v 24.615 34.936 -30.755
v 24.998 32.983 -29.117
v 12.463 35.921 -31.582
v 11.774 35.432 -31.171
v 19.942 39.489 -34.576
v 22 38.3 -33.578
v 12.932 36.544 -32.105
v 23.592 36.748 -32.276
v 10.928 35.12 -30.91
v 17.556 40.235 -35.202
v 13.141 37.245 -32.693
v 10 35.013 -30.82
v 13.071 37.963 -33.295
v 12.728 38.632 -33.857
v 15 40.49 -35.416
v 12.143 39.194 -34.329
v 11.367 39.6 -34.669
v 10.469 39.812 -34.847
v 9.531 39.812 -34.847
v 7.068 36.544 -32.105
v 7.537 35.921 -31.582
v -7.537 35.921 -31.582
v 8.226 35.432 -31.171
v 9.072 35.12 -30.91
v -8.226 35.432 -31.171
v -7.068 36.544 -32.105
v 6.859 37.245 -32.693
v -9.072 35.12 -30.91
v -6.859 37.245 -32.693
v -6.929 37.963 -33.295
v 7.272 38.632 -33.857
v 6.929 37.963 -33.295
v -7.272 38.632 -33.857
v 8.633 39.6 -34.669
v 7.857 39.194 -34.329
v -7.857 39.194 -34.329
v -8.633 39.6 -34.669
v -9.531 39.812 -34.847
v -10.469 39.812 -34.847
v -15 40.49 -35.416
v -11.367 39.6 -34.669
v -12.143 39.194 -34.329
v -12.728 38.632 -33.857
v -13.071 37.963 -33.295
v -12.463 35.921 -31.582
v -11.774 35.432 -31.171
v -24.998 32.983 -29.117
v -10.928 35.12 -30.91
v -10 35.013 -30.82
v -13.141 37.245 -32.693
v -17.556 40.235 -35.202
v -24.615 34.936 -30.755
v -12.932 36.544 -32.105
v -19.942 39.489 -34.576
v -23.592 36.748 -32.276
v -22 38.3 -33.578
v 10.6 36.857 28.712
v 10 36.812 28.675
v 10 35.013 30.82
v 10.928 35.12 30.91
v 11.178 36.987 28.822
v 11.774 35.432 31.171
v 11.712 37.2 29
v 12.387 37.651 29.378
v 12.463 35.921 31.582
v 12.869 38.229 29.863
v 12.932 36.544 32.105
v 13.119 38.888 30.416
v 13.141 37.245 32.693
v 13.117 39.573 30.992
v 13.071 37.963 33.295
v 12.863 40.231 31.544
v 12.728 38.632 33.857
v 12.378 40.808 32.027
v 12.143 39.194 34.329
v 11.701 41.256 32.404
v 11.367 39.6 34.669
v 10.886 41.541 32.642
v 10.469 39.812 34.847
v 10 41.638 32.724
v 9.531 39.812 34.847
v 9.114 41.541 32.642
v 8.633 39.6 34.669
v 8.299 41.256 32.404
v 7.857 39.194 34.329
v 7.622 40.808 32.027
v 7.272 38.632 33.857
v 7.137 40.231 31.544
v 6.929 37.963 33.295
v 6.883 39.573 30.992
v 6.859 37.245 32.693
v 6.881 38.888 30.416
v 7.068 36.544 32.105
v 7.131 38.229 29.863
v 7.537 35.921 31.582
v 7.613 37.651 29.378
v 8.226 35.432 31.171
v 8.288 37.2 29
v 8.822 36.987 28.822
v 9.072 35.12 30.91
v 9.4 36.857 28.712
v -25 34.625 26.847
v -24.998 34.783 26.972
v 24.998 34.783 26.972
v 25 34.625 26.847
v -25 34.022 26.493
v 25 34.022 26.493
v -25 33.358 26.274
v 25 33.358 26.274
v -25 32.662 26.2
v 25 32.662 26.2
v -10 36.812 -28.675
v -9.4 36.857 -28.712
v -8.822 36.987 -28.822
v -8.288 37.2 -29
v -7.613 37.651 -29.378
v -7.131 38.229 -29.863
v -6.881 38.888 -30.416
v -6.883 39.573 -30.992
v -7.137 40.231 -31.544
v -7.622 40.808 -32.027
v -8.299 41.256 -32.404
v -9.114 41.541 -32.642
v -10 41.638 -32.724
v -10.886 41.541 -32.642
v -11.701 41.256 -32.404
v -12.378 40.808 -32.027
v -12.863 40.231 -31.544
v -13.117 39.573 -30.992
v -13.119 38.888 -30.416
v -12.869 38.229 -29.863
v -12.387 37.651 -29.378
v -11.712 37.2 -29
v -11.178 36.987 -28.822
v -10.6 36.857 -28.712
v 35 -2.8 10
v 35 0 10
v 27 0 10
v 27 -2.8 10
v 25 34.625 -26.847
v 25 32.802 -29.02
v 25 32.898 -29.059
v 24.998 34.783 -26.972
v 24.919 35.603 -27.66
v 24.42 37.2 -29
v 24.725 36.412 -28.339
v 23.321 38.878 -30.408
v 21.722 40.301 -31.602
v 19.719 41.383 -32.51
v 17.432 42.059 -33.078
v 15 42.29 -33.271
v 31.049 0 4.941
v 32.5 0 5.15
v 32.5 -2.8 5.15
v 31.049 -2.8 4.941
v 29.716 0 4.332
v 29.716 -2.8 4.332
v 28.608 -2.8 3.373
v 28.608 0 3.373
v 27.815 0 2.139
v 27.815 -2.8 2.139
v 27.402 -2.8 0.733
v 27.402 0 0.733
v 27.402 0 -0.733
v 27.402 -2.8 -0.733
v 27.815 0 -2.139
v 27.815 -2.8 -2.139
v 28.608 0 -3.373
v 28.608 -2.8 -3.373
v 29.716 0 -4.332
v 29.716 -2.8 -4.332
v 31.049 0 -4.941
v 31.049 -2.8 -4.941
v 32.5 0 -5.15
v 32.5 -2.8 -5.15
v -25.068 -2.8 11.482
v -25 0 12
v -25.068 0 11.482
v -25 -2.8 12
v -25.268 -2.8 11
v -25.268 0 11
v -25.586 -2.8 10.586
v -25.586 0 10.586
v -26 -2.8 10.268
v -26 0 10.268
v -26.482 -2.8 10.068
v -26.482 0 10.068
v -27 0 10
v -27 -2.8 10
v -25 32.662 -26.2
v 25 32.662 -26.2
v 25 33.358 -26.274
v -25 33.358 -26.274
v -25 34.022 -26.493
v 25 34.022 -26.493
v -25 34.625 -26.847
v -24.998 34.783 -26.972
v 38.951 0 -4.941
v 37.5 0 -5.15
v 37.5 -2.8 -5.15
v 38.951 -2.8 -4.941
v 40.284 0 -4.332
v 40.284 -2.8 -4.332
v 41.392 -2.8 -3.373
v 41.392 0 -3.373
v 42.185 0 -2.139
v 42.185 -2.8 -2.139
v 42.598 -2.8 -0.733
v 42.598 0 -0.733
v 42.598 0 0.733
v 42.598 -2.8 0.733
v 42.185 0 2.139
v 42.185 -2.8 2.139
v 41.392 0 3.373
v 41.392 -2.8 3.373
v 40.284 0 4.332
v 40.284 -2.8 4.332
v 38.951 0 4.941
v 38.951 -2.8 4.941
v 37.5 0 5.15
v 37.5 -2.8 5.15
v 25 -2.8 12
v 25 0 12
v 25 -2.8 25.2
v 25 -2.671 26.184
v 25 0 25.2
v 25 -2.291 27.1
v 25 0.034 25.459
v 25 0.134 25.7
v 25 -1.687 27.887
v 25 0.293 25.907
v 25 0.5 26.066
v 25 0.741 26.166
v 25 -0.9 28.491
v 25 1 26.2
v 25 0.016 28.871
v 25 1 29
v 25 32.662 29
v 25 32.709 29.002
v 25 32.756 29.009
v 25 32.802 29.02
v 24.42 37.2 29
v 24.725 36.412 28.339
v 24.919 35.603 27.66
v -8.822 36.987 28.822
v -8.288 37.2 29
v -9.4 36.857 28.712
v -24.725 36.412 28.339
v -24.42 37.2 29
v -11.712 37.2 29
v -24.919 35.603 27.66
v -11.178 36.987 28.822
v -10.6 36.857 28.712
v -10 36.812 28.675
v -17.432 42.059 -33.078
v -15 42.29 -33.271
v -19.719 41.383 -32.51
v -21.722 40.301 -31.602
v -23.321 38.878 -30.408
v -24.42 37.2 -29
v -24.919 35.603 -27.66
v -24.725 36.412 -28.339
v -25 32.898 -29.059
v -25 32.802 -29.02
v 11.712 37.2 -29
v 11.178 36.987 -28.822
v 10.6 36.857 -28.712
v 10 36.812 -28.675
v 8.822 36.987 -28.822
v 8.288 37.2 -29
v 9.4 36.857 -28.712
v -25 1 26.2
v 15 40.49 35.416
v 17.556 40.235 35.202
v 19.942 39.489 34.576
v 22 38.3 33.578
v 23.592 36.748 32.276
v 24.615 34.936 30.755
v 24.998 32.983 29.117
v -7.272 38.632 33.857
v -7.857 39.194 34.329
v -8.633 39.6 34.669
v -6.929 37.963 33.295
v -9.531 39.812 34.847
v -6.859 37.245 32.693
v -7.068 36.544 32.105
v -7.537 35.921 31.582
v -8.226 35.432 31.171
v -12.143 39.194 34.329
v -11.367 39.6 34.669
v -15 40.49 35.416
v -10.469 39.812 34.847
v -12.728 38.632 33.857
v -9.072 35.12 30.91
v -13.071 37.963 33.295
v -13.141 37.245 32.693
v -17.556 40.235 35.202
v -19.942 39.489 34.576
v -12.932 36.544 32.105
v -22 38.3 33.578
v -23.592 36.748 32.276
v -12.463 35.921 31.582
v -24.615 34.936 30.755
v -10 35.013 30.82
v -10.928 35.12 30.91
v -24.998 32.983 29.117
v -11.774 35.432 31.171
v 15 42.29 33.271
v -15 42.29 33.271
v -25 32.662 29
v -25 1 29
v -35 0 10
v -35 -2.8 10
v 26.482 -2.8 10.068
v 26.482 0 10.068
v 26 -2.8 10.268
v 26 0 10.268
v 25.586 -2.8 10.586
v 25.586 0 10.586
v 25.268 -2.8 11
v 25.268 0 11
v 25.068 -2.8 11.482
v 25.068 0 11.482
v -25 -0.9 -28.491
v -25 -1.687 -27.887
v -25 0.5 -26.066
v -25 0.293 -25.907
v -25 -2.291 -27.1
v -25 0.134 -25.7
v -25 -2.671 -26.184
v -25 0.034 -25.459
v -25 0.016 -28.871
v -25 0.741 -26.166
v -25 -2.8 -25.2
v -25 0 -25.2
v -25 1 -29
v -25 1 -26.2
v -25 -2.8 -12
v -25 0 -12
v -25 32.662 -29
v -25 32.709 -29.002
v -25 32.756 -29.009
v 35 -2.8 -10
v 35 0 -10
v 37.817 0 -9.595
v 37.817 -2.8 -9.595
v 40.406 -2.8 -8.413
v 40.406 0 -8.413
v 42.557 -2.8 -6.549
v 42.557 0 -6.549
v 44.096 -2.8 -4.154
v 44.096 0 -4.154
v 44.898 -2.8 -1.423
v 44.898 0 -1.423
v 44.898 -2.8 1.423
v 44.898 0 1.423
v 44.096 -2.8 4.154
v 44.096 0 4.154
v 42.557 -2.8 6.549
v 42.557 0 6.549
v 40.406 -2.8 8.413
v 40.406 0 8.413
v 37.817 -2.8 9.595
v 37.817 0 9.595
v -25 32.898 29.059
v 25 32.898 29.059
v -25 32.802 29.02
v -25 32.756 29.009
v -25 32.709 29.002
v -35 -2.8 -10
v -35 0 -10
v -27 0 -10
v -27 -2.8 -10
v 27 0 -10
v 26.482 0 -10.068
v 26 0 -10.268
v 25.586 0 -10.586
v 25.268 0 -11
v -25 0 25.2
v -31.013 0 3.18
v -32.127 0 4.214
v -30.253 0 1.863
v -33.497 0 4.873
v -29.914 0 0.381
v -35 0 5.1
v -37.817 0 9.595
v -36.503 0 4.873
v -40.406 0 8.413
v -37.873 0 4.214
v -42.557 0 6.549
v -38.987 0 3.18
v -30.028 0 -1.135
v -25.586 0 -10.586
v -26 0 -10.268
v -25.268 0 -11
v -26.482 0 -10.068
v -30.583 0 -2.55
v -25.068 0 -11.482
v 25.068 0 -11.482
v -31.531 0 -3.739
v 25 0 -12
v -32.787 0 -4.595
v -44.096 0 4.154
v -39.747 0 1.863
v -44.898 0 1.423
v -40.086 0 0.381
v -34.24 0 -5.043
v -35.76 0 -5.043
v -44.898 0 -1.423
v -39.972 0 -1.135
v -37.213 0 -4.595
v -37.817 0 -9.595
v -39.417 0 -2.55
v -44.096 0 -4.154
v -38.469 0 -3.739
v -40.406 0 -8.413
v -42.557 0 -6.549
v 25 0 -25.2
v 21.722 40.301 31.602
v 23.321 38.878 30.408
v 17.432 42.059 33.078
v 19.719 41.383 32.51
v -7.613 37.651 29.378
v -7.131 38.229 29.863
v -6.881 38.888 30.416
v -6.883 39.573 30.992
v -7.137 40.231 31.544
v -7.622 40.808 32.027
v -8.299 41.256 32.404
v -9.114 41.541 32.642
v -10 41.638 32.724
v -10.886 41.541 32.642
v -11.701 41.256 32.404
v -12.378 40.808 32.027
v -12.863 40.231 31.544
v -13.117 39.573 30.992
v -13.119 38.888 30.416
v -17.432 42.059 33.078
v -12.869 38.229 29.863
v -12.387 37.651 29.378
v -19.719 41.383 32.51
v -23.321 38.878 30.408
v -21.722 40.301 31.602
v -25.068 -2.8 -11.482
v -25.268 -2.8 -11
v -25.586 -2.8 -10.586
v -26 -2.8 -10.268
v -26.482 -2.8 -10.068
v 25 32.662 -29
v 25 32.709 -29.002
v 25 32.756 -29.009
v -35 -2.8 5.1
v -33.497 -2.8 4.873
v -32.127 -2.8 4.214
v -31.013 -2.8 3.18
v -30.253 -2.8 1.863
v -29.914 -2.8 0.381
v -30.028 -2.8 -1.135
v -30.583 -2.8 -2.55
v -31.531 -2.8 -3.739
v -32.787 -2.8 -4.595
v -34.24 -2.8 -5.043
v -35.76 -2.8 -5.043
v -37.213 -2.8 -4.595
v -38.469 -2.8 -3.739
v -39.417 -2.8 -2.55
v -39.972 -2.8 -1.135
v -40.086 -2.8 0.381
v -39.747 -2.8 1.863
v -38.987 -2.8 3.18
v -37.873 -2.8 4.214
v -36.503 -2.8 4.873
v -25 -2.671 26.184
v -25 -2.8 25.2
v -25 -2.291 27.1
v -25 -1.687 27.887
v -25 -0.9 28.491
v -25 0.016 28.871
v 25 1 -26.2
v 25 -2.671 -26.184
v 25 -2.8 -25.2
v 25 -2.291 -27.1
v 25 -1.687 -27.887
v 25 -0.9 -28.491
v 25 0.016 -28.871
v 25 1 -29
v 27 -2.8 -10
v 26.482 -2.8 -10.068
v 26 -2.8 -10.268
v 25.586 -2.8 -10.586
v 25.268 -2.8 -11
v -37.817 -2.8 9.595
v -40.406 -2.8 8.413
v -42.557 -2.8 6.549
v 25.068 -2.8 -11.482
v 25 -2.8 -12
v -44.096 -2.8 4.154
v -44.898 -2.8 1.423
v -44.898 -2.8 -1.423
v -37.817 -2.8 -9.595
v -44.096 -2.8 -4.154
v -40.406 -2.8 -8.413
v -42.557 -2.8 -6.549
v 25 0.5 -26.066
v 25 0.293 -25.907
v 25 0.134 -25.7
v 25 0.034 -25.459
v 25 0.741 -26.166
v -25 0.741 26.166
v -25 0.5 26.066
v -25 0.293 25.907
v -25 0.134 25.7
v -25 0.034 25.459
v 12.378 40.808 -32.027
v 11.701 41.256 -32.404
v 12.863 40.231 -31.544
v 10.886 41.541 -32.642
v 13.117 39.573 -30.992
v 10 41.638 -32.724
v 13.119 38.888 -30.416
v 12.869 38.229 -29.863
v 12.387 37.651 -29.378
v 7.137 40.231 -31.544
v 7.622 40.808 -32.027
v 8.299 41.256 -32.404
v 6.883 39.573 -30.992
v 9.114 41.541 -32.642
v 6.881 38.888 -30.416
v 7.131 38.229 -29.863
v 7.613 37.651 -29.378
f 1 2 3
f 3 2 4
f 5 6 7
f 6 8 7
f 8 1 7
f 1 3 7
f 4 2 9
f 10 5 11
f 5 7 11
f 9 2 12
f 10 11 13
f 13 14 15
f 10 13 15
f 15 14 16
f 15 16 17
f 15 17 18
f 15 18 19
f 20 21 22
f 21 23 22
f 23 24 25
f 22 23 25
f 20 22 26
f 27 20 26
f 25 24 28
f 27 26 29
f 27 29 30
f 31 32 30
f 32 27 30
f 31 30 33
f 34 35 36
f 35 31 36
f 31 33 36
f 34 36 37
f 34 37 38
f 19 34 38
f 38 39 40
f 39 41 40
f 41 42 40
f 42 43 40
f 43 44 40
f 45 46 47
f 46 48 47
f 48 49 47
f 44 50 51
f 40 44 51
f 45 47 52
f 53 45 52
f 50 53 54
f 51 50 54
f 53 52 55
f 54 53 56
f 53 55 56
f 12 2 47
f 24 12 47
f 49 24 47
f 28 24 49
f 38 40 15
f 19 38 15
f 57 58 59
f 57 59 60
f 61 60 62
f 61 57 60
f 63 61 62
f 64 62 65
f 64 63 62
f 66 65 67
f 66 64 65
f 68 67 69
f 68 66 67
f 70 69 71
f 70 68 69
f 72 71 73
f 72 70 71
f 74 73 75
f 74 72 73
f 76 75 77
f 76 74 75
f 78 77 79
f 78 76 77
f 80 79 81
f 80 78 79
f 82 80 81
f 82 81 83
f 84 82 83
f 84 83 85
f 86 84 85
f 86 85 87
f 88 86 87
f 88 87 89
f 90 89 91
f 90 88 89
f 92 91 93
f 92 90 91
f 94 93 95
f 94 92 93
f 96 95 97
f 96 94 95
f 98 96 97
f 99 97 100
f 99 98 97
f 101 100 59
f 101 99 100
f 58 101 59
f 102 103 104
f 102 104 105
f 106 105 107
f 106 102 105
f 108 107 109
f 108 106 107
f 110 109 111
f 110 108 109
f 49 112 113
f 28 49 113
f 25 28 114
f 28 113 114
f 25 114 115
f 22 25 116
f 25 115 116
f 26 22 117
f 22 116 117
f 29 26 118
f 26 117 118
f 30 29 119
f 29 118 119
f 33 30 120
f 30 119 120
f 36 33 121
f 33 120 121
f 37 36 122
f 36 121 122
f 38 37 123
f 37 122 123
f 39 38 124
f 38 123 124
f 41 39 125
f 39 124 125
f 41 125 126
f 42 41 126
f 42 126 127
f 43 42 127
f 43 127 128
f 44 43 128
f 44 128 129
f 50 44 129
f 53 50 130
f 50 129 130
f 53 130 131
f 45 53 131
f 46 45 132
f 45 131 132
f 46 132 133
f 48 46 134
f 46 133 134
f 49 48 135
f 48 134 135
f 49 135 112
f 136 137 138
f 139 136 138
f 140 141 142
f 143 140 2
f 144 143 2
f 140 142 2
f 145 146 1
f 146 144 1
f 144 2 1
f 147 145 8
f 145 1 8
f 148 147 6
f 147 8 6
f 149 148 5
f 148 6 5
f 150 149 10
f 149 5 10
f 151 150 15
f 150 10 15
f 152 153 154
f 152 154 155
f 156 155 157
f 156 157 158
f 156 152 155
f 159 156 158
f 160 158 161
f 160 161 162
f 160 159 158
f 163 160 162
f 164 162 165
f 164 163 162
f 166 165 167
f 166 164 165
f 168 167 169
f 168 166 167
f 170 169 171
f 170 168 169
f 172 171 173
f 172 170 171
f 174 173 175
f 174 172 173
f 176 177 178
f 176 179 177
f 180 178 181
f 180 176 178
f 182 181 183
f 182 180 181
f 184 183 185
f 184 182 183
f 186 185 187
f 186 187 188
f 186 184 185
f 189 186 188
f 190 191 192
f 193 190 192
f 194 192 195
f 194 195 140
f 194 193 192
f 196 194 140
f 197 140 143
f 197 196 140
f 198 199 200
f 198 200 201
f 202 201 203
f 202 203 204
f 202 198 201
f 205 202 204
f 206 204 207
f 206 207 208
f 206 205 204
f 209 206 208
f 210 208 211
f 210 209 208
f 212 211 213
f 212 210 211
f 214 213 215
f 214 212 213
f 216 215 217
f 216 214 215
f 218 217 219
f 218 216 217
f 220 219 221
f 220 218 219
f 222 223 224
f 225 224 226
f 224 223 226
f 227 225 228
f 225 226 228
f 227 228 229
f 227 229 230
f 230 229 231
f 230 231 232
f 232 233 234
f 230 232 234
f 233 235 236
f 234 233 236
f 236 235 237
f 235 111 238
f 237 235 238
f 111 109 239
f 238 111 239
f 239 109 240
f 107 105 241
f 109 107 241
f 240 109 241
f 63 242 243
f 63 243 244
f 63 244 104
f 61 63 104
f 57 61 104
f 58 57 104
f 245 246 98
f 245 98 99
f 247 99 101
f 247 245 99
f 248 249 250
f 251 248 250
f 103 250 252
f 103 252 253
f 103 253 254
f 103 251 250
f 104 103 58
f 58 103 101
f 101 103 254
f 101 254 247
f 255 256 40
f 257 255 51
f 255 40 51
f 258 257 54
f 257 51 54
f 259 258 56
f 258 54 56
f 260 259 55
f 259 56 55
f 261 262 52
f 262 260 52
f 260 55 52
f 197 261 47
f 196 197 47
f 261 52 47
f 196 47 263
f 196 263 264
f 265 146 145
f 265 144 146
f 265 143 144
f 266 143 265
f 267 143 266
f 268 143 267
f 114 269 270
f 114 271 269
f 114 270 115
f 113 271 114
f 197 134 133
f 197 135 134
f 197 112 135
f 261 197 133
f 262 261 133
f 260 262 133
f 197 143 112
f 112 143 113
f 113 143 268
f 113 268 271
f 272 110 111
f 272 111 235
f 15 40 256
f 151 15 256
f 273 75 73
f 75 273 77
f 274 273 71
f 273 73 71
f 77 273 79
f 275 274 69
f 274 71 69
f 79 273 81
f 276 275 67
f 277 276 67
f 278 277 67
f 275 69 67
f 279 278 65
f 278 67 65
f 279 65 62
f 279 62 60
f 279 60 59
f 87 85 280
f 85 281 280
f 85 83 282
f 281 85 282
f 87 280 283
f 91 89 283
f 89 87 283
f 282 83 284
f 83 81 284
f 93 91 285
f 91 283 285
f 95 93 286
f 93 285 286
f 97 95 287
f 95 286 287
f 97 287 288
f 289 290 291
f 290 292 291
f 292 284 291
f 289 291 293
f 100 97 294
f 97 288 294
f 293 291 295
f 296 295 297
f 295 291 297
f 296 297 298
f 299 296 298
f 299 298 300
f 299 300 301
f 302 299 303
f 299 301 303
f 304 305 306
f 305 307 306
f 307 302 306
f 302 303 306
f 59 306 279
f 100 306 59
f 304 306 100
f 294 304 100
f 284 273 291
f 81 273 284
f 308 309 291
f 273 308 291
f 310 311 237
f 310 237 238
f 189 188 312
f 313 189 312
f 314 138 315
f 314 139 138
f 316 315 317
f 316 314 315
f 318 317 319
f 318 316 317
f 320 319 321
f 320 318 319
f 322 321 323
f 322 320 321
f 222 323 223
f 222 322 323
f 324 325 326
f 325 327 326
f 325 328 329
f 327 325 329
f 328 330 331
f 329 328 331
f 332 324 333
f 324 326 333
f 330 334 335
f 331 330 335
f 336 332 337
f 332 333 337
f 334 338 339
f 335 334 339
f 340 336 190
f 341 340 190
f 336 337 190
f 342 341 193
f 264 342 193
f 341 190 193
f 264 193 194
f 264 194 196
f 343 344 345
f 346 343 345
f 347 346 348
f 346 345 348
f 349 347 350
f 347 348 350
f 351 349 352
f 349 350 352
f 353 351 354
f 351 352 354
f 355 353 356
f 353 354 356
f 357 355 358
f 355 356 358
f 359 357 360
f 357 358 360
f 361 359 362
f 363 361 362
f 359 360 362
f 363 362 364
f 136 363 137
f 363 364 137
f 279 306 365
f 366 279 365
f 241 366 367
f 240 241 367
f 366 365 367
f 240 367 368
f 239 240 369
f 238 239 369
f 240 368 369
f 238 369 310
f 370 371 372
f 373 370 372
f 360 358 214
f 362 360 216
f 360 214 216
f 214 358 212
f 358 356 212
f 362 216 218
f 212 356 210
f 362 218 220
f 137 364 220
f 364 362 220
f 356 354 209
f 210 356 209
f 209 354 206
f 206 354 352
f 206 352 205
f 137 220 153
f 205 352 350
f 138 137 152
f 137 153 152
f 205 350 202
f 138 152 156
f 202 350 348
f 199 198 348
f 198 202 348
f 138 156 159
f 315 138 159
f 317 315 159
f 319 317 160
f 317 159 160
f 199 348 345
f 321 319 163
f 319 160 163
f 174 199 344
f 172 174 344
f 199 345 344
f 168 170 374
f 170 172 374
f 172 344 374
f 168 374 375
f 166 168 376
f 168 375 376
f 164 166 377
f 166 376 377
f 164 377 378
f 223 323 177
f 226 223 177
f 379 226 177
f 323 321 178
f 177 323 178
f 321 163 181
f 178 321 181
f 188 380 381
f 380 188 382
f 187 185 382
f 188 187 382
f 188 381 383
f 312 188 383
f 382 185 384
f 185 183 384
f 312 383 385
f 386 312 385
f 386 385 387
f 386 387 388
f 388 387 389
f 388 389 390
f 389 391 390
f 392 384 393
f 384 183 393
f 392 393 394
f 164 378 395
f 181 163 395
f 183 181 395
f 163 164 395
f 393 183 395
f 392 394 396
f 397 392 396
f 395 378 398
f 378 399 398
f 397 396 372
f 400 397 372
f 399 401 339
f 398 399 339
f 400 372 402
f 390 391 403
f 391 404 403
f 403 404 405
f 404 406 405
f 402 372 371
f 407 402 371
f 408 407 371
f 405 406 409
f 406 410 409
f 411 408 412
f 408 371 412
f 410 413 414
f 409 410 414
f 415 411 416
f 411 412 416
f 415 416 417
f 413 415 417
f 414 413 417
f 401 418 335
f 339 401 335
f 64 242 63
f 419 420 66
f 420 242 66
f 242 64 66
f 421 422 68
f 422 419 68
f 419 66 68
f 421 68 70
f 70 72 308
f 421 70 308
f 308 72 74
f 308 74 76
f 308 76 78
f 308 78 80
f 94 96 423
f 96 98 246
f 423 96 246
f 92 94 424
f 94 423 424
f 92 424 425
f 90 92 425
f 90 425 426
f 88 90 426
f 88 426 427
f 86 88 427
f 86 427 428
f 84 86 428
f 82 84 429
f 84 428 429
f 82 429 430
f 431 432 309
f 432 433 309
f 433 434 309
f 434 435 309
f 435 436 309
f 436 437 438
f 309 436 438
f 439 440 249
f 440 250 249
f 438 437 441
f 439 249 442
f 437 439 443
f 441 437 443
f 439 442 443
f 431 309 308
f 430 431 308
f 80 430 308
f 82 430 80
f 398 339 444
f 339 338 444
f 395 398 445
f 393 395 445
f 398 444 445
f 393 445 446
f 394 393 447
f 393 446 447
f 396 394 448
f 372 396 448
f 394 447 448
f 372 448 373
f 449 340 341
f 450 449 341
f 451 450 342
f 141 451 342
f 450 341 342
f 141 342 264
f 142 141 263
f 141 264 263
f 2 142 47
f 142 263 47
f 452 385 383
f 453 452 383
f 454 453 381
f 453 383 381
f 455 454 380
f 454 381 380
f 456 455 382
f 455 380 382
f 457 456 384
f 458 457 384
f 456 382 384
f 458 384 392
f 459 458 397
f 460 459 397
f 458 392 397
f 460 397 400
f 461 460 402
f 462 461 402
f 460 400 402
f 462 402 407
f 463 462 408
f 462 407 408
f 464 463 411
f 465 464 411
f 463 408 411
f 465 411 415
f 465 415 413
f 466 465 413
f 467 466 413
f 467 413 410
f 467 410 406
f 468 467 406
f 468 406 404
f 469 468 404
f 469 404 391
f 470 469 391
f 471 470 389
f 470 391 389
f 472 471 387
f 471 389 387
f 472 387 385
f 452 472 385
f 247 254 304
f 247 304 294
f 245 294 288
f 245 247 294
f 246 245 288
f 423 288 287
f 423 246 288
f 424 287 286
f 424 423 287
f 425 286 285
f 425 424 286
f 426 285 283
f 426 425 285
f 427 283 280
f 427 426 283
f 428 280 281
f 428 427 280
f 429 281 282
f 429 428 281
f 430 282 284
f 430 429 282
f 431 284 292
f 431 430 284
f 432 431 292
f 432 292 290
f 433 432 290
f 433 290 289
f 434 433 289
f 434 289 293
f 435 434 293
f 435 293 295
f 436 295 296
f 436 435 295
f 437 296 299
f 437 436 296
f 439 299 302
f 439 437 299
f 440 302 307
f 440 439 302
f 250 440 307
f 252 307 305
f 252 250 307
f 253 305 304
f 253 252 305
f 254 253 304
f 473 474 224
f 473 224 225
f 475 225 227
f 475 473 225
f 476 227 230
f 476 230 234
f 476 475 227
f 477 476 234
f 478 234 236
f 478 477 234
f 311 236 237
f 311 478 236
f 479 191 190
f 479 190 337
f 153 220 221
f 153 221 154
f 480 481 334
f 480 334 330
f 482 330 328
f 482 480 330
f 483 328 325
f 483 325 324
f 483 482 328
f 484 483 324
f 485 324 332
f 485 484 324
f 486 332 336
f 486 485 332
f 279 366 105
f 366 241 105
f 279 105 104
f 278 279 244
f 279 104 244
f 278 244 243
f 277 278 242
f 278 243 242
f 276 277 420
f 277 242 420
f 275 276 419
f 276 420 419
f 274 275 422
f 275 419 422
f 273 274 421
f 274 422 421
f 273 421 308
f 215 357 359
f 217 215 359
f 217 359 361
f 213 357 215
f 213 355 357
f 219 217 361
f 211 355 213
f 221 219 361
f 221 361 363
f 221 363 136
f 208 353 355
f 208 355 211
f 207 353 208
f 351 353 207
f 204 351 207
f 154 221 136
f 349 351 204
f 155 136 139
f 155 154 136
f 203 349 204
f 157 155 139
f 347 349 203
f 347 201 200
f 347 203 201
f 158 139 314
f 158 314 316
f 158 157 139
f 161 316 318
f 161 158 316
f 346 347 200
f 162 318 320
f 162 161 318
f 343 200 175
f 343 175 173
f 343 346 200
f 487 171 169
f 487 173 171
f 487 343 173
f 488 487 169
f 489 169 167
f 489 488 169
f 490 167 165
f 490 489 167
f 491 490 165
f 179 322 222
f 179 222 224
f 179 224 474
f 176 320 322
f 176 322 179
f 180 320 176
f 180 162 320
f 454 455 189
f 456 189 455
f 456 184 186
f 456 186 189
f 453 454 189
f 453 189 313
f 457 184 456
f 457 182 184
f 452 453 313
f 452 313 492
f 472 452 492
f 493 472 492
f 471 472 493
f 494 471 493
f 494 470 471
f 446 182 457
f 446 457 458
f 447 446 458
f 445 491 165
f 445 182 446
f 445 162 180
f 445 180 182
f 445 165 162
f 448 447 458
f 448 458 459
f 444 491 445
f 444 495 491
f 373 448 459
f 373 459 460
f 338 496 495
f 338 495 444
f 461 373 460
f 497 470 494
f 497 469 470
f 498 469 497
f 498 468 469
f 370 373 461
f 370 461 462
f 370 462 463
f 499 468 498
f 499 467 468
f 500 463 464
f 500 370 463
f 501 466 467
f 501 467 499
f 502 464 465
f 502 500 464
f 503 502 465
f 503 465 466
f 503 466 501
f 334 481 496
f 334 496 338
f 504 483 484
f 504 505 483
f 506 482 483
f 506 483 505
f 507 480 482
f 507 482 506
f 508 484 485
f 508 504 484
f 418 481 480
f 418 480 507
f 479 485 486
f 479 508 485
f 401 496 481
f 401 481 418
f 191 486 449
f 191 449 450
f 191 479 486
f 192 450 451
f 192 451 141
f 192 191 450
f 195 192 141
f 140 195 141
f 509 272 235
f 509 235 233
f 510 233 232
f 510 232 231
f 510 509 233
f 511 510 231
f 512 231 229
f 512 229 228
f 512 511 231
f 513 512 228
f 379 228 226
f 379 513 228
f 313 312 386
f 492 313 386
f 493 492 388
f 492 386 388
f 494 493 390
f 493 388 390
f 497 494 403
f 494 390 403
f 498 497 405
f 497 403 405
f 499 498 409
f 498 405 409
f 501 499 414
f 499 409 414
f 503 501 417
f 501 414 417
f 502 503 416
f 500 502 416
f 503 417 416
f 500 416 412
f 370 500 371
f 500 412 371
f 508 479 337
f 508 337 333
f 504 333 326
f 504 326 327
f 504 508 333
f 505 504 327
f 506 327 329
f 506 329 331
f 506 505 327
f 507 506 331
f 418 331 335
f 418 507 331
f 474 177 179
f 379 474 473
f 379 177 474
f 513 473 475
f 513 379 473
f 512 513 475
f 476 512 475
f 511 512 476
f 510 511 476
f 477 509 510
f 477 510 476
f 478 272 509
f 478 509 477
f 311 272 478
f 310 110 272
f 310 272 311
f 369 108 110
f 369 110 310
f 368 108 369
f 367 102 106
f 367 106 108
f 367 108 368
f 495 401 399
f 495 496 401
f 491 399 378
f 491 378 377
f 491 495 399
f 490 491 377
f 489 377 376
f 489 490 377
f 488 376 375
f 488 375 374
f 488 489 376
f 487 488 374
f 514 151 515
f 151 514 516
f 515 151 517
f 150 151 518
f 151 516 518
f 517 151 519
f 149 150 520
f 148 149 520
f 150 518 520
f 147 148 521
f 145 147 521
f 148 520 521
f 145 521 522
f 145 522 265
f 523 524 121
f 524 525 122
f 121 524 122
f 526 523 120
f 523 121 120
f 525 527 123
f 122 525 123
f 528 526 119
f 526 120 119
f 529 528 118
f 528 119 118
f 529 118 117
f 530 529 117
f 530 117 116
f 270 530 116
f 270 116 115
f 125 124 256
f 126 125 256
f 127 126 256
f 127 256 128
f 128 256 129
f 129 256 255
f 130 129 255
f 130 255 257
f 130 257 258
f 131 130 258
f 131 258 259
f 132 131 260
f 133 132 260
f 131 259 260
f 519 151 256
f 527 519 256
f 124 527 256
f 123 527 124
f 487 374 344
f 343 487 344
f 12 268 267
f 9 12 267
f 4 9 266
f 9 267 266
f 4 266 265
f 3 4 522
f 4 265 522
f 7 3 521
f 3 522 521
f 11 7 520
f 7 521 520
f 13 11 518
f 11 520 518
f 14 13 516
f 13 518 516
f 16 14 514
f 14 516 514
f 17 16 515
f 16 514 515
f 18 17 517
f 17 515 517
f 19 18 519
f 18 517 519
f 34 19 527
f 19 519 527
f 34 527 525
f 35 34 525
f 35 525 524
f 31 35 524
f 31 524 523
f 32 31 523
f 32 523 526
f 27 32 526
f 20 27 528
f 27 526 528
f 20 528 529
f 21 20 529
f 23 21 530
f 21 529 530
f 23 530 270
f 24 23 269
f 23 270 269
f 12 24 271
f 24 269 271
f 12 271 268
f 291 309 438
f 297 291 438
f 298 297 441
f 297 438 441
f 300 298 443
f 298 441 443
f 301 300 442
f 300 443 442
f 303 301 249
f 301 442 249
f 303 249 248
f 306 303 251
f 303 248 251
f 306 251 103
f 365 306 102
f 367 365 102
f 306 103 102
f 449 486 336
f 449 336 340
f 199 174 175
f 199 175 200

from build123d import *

# Parameters (mm, degrees)
SKETCH1_R                      = 5.1
BASE_FLANGE1_DEPTH             = 2.8
EDGE_FLANGE1_STRIP_W           = 13.2
EDGE_FLANGE1_STRIP_H           = 2.8
EDGE_FLANGE1_STRIP_CUT_DEPTH   = 50
EDGE_FLANGE1_STRIP_2_W         = 13.2
EDGE_FLANGE1_STRIP_2_H         = 2.8
EDGE_FLANGE1_STRIP_CUT_2_DEPTH = 50
EDGE_FLANGE1_DEPTH             = 50
EDGE_FLANGE1_BEND_DEPTH        = 50
EDGE_FLANGE2_START             = -25
EDGE_FLANGE2_DEPTH             = 50
EDGE_FLANGE2_2_DEPTH           = 50
SKETCH20_R                     = 3.15
CUT_EXTRUDE1_DEPTH             = 72.206525832
FILLET1_R                      = 10
FILLET2_R                      = 2


# Read off the part's stored shape, not the designer's step: Edge-Flange2
# Sheet-metal steps are written as plain solids
with BuildPart() as part:
    # Sketch1 → Base-Flange1 (new body)
    with BuildSketch(Plane(origin=(0, 0, 0), x_dir=(1, 0, 0), z_dir=(0, 1, 0))):
        Polygon((-25, 29), (25, 29), (25, 10), (45, 10), (45, -10), (25, -10), (25, -29), (-25, -29), (-25, -10), (-45, -10), (-45, 10), (-25, 10), align=None)
        with Locations(Location((-35, 0, 0), (0, 0, 270))):
            Circle(SKETCH1_R, mode=Mode.SUBTRACT)
        with BuildLine():
            Line((32.5, 5.15), (37.5, 5.15))
            ThreePointArc((37.5, 5.15), (42.65, 0), (37.5, -5.15))
            Line((37.5, -5.15), (32.5, -5.15))
            ThreePointArc((32.5, -5.15), (27.35, 0), (32.5, 5.15))
        make_face(mode=Mode.SUBTRACT)
    extrude(amount=-BASE_FLANGE1_DEPTH)

    # Edge-Flange1 strip (across the edge) → Edge-Flange1 strip cut (cut)
    with BuildSketch(Plane(origin=(25, 0, -29), x_dir=(0, 0, 1), z_dir=(-1, 0, 0))):
        with Locations((-2.8, -1.4)):
            Rectangle(EDGE_FLANGE1_STRIP_W, EDGE_FLANGE1_STRIP_H)
    extrude(amount=EDGE_FLANGE1_STRIP_CUT_DEPTH, mode=Mode.SUBTRACT)

    # Edge-Flange1 strip 2 (across the edge) → Edge-Flange1 strip cut 2 (cut)
    with BuildSketch(Plane(origin=(-25, 0, 29), x_dir=(0, 0, -1), z_dir=(1, 0, 0))):
        with Locations((-2.8, -1.4)):
            Rectangle(EDGE_FLANGE1_STRIP_2_W, EDGE_FLANGE1_STRIP_2_H)
    extrude(amount=EDGE_FLANGE1_STRIP_CUT_2_DEPTH, mode=Mode.SUBTRACT)

    # Edge-Flange1 section (across the edge) → Edge-Flange1 (add)
    with BuildSketch(Plane(origin=(25, 0, -29), x_dir=(0, 0, 1), z_dir=(-1, 0, 0))):
        with BuildLine():
            Line((0, 1), (0, 37.2))
            Line((0, 37.2), (2.8, 37.2))
            Line((2.8, 37.2), (2.8, 1))
            ThreePointArc((2.8, 1), (3.092893219, 0.292893219), (3.8, 0))
            Line((3.8, 0), (3.8, -2.8))
            ThreePointArc((3.8, -2.8), (1.112994231, -1.687005769), (0, 1))
        make_face()
    extrude(amount=EDGE_FLANGE1_DEPTH)

    # Edge-Flange1 section 2 (across the edge) → Edge-Flange1 bend (add)
    with BuildSketch(Plane(origin=(-25, 0, 29), x_dir=(0, 0, -1), z_dir=(1, 0, 0))):
        with BuildLine():
            Line((0, 1), (0, 37.2))
            Line((0, 37.2), (2.8, 37.2))
            Line((2.8, 37.2), (2.8, 1))
            ThreePointArc((2.8, 1), (3.092893219, 0.292893219), (3.8, 0))
            Line((3.8, 0), (3.8, -2.8))
            ThreePointArc((3.8, -2.8), (1.112994231, -1.687005769), (0, 1))
        make_face()
    extrude(amount=EDGE_FLANGE1_BEND_DEPTH)

    # Edge-Flange2 outline → Edge-Flange2 (cut)
    with BuildSketch(Plane.YZ.offset(EDGE_FLANGE2_START)):
        with BuildLine():
            ThreePointArc((32.661988168, -26.2), (33.790654641, -26.399014351), (34.78318728, -26.972053338))
            Line((34.78318728, -26.972053338), (37.2, -29))
            Line((37.2, -29), (37.2, -26.2))
            Line((37.2, -26.2), (32.661988168, -26.2))
        make_face()
        with BuildLine():
            Line((37.2, 29), (34.78318728, 26.972053338))
            ThreePointArc((34.78318728, 26.972053338), (33.790654641, 26.399014351), (32.661988168, 26.2))
            Line((32.661988168, 26.2), (37.2, 26.2))
            Line((37.2, 26.2), (37.2, 29))
        make_face()
    extrude(amount=EDGE_FLANGE2_DEPTH, mode=Mode.SUBTRACT)

    # Edge-Flange2 2 outline → Edge-Flange2 2 (add)
    with BuildSketch(Plane.YZ.offset(EDGE_FLANGE2_START)):
        with BuildLine():
            Line((42.289578815, -33.270663707), (37.2, -29))
            Line((37.2, -29), (32.661988168, -29))
            ThreePointArc((32.661988168, -29), (32.832998239, -29.03015369), (32.983381973, -29.116977778))
            Line((32.983381973, -29.116977778), (40.489773508, -35.415588147))
            Line((40.489773508, -35.415588147), (42.289578815, -33.270663707))
        make_face()
        with BuildLine():
            Line((32.661988168, 29), (37.2, 29))
            Line((37.2, 29), (42.289578815, 33.270663707))
            Line((42.289578815, 33.270663707), (40.489773508, 35.415588147))
            Line((40.489773508, 35.415588147), (32.983381973, 29.116977778))
            ThreePointArc((32.983381973, 29.116977778), (32.832998239, 29.03015369), (32.661988168, 29))
        make_face()
    extrude(amount=EDGE_FLANGE2_2_DEPTH)

    # Sketch20 → Cut-Extrude1 (cut, through all)
    with BuildSketch(Plane(origin=(0, 1.090431477, 1.29952563), x_dir=(1, 0, 0), z_dir=(0, 0.642787609686538, 0.7660444431189792))):
        with Locations(Location((-10, 49.78166725, 0), (0, 0, 270))):
            Circle(SKETCH20_R)
        with Locations(Location((10, 49.78166725, 0), (0, 0, 270))):
            Circle(SKETCH20_R)
    cut_extrude1 = extrude(amount=-CUT_EXTRUDE1_DEPTH, mode=Mode.SUBTRACT)

    # Mirror2: Cut-Extrude1 across plane
    add(cut_extrude1.mirror(Plane.XY), mode=Mode.SUBTRACT)

    # Fillet1
    # the kernel refuses this fillet: 10 mm, written as the material it takes off along each edge
    with BuildSketch(Plane(origin=(45, 25, -10), x_dir=(0, 0, 1), z_dir=(0, -1, 0)), Plane(origin=(45, 25, 10), x_dir=(-1, 0, 0), z_dir=(0, -1, 0)), Plane(origin=(-45, 25, -10), x_dir=(1, 0, 0), z_dir=(0, -1, 0)), Plane(origin=(-45, 25, 10), x_dir=(0, 0, -1), z_dir=(0, -1, 0))) as fillet1_piece_1:
        with BuildLine():
            CenterArc((FILLET1_R, FILLET1_R), FILLET1_R, 180, 90)
            Line((0, FILLET1_R), (0, 0))
            Line((0, 0), (FILLET1_R, 0))
        make_face()
    extrude(amount=52.8, mode=Mode.SUBTRACT)
    with BuildSketch(Plane(origin=(-25, 58.35926906, 14.119552631), x_dir=(0, -0.7660444430323039, -0.6427876097898334), z_dir=(0, -0.6427876097898335, 0.766044443032304)), Plane(origin=(25, 24.420083263, -54.566699223), x_dir=(-1, 0, 0), z_dir=(0, 0.6427876097898335, 0.766044443032304)), Plane(origin=(-25, 24.420083263, -54.566699223), x_dir=(0, -0.7660444430323039, 0.6427876097898334), z_dir=(0, 0.6427876097898335, 0.766044443032304))) as fillet1_piece_2:
        with BuildLine():
            CenterArc((FILLET1_R, FILLET1_R), FILLET1_R, 180, 90)
            Line((0, FILLET1_R), (0, 0))
            Line((0, 0), (FILLET1_R, 0))
        make_face()
    extrude(amount=52.799999999, mode=Mode.SUBTRACT)
    with BuildSketch(Plane(origin=(25, 58.35926906, 14.119552631), x_dir=(0, -0.766044443032304, -0.6427876097898335), z_dir=(0, -0.6427876097898335, 0.766044443032304))) as fillet1_piece_3:
        with BuildLine():
            CenterArc((FILLET1_R, -FILLET1_R), FILLET1_R, 90, 90)
            Line((0, -FILLET1_R), (0, 0))
            Line((0, 0), (FILLET1_R, 0))
        make_face()
    extrude(amount=52.799999999, mode=Mode.SUBTRACT)

    # Fillet2
    fillet2_edges = [part.edges().sort_by_distance(p)[0] for p in [
        (-25, -1.4, 10),
        (-25, -1.4, -10),
        (25, -1.4, -10),
        (25, -1.4, 10),
    ]]
    fillet(fillet2_edges, radius=FILLET2_R)


solid = part.part
